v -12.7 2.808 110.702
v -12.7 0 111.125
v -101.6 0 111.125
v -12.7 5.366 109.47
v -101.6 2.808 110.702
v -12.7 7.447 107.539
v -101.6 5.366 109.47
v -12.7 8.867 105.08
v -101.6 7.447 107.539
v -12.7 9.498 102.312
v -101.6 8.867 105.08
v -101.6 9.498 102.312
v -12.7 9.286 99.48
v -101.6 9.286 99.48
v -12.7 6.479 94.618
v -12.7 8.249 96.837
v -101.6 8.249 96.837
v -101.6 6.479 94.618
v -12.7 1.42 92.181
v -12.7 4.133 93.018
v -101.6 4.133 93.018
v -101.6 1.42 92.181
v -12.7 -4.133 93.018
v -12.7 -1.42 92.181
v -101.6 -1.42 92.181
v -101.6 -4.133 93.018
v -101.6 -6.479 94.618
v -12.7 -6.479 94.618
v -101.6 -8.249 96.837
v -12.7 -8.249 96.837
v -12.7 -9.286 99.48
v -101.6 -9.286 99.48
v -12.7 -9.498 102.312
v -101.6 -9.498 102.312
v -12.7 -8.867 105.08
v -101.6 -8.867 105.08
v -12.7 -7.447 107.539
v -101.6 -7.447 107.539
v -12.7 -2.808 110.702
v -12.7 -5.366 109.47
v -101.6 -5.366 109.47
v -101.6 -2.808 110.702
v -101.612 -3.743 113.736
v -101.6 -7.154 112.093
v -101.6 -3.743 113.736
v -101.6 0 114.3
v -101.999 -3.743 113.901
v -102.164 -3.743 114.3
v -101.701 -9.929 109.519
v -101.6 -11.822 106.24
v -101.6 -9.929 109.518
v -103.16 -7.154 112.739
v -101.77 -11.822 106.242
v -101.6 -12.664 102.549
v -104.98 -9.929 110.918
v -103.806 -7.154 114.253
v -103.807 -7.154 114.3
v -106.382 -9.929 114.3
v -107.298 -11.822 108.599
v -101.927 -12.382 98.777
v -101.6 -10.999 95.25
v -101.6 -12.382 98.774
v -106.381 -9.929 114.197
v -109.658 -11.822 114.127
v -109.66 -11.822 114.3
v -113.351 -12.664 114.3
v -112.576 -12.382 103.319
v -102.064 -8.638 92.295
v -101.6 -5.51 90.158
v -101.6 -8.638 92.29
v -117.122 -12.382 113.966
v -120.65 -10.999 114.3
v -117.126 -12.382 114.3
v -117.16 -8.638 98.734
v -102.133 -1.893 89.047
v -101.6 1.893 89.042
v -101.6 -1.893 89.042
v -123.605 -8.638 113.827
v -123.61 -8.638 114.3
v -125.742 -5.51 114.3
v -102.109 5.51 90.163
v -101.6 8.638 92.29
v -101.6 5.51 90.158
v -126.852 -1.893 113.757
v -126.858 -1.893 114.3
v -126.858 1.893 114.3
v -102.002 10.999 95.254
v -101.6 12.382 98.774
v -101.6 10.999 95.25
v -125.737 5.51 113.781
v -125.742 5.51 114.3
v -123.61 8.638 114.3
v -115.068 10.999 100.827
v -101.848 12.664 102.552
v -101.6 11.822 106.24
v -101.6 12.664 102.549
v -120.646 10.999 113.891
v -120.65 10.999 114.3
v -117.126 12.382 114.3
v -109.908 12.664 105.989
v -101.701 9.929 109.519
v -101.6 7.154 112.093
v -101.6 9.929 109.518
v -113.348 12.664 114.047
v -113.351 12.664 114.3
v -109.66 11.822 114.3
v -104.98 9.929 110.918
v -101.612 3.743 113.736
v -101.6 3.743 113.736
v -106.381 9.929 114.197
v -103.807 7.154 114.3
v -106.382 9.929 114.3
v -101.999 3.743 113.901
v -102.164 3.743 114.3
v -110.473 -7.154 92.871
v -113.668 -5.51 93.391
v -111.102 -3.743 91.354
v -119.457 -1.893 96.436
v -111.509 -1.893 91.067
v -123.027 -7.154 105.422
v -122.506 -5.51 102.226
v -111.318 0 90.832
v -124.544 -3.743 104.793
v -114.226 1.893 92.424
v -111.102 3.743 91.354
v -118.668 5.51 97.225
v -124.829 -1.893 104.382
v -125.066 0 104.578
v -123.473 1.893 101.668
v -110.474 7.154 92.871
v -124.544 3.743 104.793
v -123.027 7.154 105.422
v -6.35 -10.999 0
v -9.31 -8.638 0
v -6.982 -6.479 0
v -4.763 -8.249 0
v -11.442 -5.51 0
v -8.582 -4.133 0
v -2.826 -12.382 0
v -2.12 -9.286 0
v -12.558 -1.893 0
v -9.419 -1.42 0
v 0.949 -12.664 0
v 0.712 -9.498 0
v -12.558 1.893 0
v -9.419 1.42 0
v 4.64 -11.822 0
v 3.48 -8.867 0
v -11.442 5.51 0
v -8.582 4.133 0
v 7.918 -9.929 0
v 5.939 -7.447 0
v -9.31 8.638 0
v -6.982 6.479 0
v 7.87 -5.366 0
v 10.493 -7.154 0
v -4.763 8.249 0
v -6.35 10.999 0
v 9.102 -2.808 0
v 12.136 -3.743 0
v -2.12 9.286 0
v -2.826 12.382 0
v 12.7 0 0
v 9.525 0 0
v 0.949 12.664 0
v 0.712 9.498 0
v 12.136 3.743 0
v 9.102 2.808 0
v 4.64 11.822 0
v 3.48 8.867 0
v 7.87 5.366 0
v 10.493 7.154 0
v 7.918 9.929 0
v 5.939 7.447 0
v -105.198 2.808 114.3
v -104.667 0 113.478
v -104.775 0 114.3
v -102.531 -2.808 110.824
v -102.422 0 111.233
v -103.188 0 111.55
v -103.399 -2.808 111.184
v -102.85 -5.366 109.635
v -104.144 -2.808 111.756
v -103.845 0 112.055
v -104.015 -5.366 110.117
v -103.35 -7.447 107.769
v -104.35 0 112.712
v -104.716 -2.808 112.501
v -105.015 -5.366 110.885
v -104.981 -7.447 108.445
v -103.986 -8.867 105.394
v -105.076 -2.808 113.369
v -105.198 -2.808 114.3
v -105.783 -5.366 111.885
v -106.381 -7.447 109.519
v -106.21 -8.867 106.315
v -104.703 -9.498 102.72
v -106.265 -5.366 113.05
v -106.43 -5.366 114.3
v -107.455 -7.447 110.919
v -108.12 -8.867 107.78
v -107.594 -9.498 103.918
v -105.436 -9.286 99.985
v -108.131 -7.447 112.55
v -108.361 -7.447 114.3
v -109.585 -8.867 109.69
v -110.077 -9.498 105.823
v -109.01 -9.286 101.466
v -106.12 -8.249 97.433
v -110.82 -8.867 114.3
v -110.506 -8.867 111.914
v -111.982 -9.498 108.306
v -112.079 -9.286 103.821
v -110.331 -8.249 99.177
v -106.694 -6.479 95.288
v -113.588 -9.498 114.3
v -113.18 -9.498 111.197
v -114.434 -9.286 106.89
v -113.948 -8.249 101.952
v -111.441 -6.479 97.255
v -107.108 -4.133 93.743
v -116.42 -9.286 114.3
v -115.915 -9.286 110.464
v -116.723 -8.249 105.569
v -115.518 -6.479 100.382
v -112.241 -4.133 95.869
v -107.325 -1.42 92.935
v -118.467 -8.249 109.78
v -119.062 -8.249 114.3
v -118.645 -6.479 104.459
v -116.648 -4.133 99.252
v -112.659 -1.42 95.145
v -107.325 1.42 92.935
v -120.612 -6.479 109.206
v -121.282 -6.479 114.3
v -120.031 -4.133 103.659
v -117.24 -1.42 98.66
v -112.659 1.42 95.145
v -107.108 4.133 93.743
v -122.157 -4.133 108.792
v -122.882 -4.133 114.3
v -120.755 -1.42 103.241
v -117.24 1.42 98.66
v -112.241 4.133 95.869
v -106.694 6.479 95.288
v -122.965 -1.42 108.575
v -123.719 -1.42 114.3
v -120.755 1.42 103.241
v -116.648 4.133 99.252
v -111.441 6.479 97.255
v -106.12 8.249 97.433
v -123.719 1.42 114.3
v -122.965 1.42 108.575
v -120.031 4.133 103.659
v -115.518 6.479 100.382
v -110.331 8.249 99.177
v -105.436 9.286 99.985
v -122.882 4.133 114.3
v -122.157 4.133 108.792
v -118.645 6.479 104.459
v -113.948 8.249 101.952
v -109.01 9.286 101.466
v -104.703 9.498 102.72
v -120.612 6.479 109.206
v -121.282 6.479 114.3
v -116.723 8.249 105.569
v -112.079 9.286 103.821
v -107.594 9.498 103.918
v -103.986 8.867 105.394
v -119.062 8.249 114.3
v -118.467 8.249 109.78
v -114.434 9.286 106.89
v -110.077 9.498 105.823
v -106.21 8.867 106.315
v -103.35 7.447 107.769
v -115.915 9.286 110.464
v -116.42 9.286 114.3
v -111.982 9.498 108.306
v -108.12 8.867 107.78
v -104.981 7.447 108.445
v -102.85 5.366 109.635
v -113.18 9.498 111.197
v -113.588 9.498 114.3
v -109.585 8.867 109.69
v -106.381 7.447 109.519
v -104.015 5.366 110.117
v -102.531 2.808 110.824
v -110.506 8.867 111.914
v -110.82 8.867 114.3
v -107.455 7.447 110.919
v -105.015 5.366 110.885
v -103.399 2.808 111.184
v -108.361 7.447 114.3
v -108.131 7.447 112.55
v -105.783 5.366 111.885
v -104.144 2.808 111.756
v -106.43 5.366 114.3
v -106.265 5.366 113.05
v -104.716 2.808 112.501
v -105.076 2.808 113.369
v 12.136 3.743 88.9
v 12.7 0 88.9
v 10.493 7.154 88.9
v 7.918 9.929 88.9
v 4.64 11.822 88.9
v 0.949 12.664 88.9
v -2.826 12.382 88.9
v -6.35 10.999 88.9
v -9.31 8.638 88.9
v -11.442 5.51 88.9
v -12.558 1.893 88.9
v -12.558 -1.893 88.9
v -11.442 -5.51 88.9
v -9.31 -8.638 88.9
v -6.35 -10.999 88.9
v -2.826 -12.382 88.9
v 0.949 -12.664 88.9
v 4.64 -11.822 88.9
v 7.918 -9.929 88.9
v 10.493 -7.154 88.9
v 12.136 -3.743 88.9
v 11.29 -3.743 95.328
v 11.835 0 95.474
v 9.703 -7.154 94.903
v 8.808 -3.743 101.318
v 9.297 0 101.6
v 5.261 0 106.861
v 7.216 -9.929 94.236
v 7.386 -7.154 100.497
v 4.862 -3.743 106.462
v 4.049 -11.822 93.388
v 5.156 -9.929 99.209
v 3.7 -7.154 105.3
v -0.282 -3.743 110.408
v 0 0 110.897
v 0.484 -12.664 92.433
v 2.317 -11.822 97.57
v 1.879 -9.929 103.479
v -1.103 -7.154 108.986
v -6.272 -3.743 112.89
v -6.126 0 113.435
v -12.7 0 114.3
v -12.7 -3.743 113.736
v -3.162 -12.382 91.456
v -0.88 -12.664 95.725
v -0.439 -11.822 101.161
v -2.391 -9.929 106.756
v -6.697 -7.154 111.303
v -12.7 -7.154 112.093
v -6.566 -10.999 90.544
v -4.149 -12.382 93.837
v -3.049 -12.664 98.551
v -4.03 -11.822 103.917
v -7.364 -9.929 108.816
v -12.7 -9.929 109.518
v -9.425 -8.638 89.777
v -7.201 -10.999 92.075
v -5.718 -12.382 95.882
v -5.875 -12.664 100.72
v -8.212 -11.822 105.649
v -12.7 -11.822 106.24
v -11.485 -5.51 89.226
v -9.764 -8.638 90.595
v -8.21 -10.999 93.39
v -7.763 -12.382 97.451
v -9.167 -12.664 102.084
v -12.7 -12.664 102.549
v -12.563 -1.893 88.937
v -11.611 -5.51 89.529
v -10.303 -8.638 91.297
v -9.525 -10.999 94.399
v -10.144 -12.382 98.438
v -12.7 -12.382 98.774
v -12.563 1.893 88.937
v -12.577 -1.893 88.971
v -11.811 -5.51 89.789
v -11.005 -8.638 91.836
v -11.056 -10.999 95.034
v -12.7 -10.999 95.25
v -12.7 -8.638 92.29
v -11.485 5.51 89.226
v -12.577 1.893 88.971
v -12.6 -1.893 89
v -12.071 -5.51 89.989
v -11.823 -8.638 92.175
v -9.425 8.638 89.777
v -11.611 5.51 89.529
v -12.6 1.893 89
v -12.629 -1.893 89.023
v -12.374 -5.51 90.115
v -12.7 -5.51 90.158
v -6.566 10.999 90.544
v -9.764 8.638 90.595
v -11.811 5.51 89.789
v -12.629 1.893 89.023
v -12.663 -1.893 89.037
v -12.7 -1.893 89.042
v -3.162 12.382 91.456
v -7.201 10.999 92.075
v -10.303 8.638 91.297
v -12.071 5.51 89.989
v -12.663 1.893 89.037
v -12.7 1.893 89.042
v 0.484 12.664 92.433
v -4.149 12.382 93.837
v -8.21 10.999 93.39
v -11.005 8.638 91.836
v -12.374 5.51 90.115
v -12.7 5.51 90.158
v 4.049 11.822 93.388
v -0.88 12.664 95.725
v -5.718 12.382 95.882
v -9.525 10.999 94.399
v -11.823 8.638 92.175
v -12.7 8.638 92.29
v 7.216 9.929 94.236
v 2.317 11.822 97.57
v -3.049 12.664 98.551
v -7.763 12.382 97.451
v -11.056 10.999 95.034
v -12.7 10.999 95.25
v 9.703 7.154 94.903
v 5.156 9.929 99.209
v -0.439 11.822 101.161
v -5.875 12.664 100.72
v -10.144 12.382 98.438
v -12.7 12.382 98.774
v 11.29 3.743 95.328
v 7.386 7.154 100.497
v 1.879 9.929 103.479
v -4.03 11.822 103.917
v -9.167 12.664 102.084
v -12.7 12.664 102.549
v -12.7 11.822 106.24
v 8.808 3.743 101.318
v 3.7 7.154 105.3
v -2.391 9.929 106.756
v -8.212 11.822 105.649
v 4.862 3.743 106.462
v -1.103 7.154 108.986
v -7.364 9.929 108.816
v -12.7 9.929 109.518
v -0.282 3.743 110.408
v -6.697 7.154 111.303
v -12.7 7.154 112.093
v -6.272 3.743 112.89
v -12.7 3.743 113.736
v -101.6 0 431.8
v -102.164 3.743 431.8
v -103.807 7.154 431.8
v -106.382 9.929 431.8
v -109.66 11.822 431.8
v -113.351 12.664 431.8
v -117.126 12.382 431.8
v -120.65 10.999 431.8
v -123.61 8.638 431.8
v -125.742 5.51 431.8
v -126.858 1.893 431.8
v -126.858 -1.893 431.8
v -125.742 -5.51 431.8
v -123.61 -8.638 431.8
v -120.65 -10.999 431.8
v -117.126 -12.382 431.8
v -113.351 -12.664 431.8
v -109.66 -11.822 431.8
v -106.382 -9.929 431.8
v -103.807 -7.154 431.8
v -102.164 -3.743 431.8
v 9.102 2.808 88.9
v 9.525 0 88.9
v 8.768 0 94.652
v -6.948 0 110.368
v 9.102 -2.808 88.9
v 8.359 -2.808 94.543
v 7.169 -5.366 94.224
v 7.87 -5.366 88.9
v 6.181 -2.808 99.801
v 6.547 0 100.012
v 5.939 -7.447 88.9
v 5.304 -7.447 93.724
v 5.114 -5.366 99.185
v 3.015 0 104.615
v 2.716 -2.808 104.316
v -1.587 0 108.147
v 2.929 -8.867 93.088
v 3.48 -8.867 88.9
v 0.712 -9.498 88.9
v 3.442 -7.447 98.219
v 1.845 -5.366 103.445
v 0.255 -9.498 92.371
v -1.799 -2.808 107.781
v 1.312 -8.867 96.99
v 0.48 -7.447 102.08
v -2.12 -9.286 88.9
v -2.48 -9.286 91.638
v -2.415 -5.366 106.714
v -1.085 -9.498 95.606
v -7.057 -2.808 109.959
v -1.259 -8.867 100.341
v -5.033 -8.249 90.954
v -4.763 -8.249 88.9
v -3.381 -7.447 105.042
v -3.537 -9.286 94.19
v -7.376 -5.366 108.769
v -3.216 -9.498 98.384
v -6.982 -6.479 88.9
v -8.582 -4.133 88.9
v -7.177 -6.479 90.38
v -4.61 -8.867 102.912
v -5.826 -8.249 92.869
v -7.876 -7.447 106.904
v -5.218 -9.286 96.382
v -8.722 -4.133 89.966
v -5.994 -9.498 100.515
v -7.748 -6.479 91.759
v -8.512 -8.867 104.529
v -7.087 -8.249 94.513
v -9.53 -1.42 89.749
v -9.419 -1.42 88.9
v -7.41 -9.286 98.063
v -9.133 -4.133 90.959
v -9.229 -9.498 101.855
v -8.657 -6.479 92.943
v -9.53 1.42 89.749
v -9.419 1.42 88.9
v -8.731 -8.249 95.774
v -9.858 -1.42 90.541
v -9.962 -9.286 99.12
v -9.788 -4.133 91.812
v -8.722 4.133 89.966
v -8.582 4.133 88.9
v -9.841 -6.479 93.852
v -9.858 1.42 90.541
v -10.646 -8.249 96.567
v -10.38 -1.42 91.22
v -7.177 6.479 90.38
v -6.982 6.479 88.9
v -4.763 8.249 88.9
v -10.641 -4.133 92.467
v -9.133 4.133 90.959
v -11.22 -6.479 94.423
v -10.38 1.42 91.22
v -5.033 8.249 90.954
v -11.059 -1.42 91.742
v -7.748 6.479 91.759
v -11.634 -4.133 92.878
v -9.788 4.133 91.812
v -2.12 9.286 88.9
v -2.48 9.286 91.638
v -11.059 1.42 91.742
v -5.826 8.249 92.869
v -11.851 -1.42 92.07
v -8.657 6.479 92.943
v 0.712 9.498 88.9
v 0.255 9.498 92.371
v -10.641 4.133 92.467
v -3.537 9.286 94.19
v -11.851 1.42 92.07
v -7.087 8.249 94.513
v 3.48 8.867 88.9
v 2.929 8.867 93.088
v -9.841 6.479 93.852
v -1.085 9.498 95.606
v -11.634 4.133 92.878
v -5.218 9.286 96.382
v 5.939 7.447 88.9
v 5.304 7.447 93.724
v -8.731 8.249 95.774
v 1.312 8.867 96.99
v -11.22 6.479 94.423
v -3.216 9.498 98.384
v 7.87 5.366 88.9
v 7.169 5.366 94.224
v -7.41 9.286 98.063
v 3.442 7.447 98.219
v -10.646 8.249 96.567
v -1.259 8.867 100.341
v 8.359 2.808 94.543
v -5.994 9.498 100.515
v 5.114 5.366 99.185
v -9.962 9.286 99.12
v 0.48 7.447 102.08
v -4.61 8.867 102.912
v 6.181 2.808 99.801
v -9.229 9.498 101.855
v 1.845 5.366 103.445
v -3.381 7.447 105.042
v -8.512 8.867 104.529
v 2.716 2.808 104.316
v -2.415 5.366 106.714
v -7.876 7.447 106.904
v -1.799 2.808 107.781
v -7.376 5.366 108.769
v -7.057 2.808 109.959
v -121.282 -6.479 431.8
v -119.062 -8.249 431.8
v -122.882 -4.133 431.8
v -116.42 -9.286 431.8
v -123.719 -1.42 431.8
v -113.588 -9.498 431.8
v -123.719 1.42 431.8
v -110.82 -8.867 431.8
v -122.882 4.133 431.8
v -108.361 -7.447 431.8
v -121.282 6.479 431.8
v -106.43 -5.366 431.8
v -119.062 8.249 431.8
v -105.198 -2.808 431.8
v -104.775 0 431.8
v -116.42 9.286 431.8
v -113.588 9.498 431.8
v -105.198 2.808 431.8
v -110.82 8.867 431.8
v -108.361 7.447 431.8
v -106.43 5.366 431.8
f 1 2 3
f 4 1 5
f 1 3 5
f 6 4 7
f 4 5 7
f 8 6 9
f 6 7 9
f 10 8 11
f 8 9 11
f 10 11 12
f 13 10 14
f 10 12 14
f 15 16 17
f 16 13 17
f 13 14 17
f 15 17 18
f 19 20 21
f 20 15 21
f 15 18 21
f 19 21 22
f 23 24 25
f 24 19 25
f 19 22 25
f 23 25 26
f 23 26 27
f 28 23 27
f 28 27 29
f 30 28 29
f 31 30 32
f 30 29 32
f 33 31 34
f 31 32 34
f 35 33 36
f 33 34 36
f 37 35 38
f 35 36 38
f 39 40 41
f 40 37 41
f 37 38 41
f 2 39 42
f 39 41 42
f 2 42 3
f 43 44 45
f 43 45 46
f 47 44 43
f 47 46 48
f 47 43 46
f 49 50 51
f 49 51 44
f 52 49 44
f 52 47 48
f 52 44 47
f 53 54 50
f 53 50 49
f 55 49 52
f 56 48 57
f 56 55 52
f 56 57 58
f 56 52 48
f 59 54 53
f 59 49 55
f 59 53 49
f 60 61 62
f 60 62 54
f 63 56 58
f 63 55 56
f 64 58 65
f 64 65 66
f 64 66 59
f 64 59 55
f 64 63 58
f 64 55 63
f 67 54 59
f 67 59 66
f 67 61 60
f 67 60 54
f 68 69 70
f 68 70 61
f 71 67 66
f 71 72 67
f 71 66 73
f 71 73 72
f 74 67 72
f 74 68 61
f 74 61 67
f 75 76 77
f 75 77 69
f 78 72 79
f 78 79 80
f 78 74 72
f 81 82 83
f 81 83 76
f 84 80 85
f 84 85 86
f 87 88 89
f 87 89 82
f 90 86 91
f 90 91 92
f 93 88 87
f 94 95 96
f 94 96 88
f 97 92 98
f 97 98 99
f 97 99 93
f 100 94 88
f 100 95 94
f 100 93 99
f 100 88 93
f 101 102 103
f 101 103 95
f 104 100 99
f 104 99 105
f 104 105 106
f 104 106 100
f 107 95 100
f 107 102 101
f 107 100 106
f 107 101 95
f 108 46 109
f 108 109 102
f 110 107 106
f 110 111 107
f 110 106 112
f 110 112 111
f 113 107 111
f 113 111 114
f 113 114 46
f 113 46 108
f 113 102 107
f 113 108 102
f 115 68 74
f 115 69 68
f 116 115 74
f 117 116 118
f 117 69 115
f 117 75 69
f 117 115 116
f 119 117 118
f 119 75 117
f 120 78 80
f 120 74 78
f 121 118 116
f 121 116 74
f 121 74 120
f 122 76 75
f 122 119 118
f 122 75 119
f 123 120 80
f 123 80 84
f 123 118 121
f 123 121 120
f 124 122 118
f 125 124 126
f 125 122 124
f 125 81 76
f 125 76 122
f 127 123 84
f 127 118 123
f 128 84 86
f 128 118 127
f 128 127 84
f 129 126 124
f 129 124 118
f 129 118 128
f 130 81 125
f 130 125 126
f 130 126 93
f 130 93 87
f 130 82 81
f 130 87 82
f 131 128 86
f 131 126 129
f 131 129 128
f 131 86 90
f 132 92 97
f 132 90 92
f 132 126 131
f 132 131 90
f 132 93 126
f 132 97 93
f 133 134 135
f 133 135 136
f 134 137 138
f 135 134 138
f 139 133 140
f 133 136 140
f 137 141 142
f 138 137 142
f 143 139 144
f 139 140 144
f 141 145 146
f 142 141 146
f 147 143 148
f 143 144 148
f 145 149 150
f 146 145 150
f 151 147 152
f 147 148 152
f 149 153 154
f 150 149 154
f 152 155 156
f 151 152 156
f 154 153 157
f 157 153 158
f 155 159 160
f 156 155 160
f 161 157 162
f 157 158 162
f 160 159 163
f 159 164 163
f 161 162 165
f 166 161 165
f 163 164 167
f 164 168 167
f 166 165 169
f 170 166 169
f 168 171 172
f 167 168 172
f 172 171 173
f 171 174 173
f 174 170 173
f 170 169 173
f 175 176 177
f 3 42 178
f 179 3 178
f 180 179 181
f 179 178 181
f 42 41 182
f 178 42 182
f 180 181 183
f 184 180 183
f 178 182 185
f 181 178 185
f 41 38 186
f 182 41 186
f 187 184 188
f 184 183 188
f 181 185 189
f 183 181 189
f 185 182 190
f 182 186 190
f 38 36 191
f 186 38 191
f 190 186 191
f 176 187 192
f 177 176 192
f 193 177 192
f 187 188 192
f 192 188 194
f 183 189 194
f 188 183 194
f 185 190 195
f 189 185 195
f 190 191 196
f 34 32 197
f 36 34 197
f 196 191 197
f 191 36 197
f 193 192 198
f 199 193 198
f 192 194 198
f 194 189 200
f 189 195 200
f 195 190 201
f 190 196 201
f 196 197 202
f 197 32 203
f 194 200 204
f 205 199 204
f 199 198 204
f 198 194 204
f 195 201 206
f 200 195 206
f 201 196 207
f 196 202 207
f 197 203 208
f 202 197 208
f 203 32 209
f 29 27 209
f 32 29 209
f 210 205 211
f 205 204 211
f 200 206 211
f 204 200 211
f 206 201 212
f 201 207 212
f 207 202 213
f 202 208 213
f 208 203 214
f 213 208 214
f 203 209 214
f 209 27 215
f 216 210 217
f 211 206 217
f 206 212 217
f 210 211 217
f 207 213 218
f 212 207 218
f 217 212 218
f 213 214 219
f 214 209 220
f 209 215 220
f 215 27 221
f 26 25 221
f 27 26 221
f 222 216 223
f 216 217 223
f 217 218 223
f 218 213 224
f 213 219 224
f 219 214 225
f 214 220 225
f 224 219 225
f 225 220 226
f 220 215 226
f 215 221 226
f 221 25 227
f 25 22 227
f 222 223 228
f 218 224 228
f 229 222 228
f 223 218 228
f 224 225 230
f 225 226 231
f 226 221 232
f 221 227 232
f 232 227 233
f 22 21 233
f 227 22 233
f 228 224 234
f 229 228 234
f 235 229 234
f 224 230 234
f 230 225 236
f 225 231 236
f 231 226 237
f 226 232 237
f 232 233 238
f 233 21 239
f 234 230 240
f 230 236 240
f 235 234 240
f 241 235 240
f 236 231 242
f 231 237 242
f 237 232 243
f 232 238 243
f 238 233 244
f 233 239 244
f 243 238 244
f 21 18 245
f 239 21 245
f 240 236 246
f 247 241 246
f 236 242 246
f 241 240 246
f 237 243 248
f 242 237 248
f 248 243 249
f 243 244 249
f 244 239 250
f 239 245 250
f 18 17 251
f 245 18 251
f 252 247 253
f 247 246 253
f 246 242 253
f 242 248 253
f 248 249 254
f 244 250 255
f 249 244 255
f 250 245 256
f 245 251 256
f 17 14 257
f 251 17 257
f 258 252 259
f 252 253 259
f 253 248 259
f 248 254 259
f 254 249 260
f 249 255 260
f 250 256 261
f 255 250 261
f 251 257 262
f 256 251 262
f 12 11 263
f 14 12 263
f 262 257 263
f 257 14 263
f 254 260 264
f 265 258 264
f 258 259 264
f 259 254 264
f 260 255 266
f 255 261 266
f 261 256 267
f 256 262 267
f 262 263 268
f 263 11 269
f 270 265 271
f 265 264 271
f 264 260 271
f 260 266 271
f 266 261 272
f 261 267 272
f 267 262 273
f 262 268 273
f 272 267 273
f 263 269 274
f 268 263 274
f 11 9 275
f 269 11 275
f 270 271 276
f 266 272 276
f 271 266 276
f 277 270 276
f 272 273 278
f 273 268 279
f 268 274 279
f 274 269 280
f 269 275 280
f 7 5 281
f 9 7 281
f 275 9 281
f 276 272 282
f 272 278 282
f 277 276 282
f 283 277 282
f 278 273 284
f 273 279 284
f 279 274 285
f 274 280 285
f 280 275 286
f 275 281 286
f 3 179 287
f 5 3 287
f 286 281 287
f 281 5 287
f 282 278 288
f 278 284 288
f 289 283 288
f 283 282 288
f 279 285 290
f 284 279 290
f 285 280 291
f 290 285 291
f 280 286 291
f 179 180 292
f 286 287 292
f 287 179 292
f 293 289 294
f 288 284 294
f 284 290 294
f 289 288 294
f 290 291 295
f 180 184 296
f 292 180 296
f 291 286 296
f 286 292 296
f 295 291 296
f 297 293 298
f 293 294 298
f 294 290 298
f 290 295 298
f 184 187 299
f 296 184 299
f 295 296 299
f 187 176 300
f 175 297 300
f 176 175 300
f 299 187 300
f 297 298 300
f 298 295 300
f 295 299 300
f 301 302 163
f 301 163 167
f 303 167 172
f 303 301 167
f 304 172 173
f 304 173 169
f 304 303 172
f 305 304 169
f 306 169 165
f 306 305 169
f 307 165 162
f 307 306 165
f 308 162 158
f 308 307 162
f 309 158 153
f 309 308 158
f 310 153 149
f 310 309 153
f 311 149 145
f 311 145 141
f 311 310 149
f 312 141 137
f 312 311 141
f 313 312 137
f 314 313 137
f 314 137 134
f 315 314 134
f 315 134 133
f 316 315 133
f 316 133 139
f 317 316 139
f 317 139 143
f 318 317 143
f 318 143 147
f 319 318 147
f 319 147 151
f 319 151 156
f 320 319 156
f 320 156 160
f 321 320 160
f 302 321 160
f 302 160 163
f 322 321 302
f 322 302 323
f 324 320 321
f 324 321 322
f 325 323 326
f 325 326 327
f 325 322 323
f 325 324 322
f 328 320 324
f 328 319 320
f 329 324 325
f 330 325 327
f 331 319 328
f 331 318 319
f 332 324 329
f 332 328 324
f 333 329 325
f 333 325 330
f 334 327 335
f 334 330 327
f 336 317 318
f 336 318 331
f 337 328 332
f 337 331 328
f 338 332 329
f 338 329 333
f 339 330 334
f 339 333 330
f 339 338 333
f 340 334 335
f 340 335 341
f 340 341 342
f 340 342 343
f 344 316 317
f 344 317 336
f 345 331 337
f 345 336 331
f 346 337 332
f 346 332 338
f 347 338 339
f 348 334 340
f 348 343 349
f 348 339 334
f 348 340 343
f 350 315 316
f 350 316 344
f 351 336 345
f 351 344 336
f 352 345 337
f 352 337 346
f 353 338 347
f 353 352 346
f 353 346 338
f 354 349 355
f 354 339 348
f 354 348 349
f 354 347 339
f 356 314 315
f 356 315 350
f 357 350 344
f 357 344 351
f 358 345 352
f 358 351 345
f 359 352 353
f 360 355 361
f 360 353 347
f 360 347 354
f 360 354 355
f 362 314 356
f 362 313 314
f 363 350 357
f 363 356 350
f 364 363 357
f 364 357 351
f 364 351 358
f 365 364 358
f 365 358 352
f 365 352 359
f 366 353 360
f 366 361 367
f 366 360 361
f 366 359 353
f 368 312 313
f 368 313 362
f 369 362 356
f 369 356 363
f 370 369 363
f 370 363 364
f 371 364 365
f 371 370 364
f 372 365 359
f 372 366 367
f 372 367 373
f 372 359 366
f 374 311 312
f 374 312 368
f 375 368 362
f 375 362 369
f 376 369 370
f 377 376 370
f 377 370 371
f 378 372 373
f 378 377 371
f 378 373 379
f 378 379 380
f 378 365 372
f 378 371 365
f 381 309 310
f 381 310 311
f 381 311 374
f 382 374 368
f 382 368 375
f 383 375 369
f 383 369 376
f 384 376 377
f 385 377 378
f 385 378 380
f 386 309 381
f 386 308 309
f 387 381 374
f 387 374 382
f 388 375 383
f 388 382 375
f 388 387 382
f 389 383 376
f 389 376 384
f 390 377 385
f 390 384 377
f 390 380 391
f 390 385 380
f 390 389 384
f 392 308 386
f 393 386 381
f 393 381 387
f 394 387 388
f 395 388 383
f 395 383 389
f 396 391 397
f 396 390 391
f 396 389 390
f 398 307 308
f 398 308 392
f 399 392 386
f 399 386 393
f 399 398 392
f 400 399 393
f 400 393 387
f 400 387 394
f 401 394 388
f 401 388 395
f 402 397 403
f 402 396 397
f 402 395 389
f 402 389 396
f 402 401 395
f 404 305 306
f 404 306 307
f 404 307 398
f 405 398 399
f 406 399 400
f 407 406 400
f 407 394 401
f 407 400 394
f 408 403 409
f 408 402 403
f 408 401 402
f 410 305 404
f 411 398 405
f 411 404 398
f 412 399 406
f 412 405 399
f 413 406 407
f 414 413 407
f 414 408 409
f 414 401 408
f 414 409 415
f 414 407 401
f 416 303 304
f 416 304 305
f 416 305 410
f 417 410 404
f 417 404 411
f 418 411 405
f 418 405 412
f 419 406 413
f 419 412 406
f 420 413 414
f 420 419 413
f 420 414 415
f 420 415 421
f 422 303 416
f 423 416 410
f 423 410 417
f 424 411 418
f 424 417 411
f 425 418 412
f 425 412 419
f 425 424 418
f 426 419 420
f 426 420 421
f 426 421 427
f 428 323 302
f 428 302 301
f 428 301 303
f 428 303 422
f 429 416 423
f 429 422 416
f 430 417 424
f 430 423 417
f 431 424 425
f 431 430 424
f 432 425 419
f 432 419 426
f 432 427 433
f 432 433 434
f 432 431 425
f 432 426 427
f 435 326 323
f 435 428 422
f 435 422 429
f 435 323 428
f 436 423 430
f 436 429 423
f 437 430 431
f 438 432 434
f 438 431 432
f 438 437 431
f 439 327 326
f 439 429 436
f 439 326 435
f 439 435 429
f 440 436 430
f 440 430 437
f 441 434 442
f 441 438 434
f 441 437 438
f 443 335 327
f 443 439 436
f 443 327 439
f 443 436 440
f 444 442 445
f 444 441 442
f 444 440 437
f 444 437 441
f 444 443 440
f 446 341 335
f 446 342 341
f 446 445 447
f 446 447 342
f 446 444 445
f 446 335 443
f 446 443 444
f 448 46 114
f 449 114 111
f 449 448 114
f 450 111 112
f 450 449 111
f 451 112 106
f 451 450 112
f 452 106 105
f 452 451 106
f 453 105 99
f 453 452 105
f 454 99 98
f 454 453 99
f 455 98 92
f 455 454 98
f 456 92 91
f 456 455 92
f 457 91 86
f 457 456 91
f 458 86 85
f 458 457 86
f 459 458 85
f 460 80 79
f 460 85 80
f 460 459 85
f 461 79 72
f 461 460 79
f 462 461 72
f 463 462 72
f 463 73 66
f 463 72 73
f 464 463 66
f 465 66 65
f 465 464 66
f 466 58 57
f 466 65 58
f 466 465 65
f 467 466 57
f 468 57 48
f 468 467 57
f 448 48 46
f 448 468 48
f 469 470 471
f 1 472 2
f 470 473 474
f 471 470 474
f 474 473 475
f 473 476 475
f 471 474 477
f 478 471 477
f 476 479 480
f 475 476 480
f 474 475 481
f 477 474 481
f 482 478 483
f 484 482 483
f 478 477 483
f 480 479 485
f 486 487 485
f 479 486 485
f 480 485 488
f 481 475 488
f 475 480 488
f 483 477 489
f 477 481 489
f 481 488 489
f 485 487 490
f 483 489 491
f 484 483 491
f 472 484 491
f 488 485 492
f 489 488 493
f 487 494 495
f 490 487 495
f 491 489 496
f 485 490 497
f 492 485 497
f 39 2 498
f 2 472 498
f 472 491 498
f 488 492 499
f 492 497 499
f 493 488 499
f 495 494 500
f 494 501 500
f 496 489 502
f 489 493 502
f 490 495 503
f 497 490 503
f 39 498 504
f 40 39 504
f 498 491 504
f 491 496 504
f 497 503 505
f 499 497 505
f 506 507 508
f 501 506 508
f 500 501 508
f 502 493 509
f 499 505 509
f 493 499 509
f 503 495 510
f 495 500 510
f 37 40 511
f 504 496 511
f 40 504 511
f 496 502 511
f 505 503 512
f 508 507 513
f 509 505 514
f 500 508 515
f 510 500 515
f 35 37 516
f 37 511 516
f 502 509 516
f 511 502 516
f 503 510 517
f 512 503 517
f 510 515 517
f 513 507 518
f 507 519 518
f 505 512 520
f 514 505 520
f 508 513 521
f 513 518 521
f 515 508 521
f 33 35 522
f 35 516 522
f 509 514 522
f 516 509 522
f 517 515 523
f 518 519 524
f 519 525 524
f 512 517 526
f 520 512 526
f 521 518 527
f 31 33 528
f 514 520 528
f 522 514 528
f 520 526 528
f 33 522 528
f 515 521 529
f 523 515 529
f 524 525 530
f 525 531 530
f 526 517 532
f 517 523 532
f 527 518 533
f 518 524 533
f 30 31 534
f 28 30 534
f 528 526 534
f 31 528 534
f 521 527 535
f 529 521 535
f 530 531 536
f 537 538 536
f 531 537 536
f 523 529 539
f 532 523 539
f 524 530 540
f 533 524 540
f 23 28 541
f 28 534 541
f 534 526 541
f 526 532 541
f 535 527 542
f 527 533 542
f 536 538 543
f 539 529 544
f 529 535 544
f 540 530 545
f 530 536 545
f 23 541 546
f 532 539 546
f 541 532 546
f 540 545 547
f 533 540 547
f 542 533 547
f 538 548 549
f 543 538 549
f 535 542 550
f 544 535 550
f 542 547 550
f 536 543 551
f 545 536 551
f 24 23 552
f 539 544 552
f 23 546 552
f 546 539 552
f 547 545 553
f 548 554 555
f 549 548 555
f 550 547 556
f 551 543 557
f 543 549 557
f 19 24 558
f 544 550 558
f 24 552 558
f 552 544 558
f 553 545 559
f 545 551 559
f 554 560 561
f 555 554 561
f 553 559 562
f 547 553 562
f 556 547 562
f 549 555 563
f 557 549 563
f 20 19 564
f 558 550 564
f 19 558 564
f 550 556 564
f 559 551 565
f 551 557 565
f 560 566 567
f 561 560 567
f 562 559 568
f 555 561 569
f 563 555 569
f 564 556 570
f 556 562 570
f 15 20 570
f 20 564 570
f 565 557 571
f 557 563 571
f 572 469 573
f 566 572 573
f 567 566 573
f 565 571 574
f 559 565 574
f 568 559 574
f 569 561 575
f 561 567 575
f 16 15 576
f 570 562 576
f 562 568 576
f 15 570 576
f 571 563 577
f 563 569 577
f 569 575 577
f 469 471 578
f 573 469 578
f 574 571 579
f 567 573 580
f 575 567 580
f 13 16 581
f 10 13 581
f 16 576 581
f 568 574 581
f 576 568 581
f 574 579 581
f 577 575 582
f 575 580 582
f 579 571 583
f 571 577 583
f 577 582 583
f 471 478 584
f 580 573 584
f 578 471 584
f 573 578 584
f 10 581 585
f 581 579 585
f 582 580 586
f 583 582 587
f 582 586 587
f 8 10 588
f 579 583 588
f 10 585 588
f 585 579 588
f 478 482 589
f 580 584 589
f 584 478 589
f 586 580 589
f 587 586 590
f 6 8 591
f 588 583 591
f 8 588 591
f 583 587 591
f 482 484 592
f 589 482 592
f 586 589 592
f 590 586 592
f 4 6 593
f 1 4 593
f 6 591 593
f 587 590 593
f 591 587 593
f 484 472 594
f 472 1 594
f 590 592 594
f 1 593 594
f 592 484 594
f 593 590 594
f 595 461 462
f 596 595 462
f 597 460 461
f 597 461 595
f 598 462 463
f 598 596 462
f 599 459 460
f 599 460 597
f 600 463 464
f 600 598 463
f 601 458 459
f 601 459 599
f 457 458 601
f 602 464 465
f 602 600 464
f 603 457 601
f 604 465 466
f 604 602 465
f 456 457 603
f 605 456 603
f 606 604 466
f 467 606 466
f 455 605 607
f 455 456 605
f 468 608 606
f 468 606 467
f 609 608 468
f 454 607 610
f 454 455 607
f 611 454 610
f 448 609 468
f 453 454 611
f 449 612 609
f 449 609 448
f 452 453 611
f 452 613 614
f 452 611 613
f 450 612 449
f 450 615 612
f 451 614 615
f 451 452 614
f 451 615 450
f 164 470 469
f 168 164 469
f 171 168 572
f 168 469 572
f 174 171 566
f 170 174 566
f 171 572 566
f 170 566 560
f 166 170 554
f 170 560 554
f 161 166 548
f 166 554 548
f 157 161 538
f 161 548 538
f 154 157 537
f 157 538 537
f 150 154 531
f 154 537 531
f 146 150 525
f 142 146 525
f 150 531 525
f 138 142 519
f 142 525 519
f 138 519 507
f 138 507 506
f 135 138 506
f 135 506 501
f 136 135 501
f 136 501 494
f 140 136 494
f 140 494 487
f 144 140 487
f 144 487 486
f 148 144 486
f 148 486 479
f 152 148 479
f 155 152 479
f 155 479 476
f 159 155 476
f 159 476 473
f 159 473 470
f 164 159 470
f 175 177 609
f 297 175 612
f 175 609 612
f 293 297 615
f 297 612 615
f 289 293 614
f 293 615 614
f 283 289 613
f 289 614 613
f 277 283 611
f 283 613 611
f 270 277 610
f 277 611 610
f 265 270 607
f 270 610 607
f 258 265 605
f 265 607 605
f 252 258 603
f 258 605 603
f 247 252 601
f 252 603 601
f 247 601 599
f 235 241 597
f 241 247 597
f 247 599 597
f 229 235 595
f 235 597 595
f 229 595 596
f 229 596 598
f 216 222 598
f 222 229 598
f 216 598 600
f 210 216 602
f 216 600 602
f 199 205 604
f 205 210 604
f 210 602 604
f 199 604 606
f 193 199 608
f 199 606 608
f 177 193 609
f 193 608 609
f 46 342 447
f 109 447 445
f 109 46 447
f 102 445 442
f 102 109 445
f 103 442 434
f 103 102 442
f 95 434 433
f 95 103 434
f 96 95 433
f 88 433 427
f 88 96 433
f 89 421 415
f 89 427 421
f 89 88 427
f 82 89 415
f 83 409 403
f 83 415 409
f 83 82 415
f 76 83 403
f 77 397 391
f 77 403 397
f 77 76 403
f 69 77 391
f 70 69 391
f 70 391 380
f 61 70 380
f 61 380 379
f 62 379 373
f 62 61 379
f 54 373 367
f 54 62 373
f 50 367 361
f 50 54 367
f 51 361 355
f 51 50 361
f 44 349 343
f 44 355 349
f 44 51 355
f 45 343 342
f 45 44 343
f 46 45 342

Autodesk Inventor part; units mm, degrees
ref_plane "YZ Plane" through (0, 0, 0) normal (1, 0, 0) x (0, 1, 0)
ref_plane "XZ Plane" through (0, 0, 0) normal (0, 1, 0) x (-1, 0, 0)
sketch "Sketch1" plane through (0, 0, 0) normal (0, 1, 0) x (-1, 0, 0)
  line L0 (0, 0) -> (0, 88.9)
  line L1 (12.7, 101.6) -> (101.6, 101.6)
  line L2 (114.3, 114.3) -> (114.3, 431.8)
  arc A0 (101.6, 101.6) -> (114.3, 114.3) centre (101.6, 114.3) ccw
  arc A1 (12.7, 101.6) -> (0, 88.9) centre (12.7, 88.9) ccw
  point P0 (0, 101.6)
  point P1 (114.3, 101.6)
  dimension "short" = 101.6
  dimension "right" = 114.3
  dimension "long" = 330.2
  dimension "turn_radius" = 12.7
  dimension "d10" = 12.7
sketch "Sketch2" plane through (0, 0, 0) normal (0, 0, 1) x (1, 0, 0)
  circle A0 centre (0, 0) radius 12.7
  circle A1 centre (0, 0) radius 9.525
  dimension "outsideDiam" = 25.4
  dimension "insideDiam" = 19.05
sweep "Sweep2" add profiles "Sketch2" path "Sketch1"
ref_plane "Work Plane1" through (0, 0, 203.2) normal (0, 0, 1) x (1, 0, 0)
properties part number "AsBuilt Aluminum Arm" material "Aluminum 6061"
